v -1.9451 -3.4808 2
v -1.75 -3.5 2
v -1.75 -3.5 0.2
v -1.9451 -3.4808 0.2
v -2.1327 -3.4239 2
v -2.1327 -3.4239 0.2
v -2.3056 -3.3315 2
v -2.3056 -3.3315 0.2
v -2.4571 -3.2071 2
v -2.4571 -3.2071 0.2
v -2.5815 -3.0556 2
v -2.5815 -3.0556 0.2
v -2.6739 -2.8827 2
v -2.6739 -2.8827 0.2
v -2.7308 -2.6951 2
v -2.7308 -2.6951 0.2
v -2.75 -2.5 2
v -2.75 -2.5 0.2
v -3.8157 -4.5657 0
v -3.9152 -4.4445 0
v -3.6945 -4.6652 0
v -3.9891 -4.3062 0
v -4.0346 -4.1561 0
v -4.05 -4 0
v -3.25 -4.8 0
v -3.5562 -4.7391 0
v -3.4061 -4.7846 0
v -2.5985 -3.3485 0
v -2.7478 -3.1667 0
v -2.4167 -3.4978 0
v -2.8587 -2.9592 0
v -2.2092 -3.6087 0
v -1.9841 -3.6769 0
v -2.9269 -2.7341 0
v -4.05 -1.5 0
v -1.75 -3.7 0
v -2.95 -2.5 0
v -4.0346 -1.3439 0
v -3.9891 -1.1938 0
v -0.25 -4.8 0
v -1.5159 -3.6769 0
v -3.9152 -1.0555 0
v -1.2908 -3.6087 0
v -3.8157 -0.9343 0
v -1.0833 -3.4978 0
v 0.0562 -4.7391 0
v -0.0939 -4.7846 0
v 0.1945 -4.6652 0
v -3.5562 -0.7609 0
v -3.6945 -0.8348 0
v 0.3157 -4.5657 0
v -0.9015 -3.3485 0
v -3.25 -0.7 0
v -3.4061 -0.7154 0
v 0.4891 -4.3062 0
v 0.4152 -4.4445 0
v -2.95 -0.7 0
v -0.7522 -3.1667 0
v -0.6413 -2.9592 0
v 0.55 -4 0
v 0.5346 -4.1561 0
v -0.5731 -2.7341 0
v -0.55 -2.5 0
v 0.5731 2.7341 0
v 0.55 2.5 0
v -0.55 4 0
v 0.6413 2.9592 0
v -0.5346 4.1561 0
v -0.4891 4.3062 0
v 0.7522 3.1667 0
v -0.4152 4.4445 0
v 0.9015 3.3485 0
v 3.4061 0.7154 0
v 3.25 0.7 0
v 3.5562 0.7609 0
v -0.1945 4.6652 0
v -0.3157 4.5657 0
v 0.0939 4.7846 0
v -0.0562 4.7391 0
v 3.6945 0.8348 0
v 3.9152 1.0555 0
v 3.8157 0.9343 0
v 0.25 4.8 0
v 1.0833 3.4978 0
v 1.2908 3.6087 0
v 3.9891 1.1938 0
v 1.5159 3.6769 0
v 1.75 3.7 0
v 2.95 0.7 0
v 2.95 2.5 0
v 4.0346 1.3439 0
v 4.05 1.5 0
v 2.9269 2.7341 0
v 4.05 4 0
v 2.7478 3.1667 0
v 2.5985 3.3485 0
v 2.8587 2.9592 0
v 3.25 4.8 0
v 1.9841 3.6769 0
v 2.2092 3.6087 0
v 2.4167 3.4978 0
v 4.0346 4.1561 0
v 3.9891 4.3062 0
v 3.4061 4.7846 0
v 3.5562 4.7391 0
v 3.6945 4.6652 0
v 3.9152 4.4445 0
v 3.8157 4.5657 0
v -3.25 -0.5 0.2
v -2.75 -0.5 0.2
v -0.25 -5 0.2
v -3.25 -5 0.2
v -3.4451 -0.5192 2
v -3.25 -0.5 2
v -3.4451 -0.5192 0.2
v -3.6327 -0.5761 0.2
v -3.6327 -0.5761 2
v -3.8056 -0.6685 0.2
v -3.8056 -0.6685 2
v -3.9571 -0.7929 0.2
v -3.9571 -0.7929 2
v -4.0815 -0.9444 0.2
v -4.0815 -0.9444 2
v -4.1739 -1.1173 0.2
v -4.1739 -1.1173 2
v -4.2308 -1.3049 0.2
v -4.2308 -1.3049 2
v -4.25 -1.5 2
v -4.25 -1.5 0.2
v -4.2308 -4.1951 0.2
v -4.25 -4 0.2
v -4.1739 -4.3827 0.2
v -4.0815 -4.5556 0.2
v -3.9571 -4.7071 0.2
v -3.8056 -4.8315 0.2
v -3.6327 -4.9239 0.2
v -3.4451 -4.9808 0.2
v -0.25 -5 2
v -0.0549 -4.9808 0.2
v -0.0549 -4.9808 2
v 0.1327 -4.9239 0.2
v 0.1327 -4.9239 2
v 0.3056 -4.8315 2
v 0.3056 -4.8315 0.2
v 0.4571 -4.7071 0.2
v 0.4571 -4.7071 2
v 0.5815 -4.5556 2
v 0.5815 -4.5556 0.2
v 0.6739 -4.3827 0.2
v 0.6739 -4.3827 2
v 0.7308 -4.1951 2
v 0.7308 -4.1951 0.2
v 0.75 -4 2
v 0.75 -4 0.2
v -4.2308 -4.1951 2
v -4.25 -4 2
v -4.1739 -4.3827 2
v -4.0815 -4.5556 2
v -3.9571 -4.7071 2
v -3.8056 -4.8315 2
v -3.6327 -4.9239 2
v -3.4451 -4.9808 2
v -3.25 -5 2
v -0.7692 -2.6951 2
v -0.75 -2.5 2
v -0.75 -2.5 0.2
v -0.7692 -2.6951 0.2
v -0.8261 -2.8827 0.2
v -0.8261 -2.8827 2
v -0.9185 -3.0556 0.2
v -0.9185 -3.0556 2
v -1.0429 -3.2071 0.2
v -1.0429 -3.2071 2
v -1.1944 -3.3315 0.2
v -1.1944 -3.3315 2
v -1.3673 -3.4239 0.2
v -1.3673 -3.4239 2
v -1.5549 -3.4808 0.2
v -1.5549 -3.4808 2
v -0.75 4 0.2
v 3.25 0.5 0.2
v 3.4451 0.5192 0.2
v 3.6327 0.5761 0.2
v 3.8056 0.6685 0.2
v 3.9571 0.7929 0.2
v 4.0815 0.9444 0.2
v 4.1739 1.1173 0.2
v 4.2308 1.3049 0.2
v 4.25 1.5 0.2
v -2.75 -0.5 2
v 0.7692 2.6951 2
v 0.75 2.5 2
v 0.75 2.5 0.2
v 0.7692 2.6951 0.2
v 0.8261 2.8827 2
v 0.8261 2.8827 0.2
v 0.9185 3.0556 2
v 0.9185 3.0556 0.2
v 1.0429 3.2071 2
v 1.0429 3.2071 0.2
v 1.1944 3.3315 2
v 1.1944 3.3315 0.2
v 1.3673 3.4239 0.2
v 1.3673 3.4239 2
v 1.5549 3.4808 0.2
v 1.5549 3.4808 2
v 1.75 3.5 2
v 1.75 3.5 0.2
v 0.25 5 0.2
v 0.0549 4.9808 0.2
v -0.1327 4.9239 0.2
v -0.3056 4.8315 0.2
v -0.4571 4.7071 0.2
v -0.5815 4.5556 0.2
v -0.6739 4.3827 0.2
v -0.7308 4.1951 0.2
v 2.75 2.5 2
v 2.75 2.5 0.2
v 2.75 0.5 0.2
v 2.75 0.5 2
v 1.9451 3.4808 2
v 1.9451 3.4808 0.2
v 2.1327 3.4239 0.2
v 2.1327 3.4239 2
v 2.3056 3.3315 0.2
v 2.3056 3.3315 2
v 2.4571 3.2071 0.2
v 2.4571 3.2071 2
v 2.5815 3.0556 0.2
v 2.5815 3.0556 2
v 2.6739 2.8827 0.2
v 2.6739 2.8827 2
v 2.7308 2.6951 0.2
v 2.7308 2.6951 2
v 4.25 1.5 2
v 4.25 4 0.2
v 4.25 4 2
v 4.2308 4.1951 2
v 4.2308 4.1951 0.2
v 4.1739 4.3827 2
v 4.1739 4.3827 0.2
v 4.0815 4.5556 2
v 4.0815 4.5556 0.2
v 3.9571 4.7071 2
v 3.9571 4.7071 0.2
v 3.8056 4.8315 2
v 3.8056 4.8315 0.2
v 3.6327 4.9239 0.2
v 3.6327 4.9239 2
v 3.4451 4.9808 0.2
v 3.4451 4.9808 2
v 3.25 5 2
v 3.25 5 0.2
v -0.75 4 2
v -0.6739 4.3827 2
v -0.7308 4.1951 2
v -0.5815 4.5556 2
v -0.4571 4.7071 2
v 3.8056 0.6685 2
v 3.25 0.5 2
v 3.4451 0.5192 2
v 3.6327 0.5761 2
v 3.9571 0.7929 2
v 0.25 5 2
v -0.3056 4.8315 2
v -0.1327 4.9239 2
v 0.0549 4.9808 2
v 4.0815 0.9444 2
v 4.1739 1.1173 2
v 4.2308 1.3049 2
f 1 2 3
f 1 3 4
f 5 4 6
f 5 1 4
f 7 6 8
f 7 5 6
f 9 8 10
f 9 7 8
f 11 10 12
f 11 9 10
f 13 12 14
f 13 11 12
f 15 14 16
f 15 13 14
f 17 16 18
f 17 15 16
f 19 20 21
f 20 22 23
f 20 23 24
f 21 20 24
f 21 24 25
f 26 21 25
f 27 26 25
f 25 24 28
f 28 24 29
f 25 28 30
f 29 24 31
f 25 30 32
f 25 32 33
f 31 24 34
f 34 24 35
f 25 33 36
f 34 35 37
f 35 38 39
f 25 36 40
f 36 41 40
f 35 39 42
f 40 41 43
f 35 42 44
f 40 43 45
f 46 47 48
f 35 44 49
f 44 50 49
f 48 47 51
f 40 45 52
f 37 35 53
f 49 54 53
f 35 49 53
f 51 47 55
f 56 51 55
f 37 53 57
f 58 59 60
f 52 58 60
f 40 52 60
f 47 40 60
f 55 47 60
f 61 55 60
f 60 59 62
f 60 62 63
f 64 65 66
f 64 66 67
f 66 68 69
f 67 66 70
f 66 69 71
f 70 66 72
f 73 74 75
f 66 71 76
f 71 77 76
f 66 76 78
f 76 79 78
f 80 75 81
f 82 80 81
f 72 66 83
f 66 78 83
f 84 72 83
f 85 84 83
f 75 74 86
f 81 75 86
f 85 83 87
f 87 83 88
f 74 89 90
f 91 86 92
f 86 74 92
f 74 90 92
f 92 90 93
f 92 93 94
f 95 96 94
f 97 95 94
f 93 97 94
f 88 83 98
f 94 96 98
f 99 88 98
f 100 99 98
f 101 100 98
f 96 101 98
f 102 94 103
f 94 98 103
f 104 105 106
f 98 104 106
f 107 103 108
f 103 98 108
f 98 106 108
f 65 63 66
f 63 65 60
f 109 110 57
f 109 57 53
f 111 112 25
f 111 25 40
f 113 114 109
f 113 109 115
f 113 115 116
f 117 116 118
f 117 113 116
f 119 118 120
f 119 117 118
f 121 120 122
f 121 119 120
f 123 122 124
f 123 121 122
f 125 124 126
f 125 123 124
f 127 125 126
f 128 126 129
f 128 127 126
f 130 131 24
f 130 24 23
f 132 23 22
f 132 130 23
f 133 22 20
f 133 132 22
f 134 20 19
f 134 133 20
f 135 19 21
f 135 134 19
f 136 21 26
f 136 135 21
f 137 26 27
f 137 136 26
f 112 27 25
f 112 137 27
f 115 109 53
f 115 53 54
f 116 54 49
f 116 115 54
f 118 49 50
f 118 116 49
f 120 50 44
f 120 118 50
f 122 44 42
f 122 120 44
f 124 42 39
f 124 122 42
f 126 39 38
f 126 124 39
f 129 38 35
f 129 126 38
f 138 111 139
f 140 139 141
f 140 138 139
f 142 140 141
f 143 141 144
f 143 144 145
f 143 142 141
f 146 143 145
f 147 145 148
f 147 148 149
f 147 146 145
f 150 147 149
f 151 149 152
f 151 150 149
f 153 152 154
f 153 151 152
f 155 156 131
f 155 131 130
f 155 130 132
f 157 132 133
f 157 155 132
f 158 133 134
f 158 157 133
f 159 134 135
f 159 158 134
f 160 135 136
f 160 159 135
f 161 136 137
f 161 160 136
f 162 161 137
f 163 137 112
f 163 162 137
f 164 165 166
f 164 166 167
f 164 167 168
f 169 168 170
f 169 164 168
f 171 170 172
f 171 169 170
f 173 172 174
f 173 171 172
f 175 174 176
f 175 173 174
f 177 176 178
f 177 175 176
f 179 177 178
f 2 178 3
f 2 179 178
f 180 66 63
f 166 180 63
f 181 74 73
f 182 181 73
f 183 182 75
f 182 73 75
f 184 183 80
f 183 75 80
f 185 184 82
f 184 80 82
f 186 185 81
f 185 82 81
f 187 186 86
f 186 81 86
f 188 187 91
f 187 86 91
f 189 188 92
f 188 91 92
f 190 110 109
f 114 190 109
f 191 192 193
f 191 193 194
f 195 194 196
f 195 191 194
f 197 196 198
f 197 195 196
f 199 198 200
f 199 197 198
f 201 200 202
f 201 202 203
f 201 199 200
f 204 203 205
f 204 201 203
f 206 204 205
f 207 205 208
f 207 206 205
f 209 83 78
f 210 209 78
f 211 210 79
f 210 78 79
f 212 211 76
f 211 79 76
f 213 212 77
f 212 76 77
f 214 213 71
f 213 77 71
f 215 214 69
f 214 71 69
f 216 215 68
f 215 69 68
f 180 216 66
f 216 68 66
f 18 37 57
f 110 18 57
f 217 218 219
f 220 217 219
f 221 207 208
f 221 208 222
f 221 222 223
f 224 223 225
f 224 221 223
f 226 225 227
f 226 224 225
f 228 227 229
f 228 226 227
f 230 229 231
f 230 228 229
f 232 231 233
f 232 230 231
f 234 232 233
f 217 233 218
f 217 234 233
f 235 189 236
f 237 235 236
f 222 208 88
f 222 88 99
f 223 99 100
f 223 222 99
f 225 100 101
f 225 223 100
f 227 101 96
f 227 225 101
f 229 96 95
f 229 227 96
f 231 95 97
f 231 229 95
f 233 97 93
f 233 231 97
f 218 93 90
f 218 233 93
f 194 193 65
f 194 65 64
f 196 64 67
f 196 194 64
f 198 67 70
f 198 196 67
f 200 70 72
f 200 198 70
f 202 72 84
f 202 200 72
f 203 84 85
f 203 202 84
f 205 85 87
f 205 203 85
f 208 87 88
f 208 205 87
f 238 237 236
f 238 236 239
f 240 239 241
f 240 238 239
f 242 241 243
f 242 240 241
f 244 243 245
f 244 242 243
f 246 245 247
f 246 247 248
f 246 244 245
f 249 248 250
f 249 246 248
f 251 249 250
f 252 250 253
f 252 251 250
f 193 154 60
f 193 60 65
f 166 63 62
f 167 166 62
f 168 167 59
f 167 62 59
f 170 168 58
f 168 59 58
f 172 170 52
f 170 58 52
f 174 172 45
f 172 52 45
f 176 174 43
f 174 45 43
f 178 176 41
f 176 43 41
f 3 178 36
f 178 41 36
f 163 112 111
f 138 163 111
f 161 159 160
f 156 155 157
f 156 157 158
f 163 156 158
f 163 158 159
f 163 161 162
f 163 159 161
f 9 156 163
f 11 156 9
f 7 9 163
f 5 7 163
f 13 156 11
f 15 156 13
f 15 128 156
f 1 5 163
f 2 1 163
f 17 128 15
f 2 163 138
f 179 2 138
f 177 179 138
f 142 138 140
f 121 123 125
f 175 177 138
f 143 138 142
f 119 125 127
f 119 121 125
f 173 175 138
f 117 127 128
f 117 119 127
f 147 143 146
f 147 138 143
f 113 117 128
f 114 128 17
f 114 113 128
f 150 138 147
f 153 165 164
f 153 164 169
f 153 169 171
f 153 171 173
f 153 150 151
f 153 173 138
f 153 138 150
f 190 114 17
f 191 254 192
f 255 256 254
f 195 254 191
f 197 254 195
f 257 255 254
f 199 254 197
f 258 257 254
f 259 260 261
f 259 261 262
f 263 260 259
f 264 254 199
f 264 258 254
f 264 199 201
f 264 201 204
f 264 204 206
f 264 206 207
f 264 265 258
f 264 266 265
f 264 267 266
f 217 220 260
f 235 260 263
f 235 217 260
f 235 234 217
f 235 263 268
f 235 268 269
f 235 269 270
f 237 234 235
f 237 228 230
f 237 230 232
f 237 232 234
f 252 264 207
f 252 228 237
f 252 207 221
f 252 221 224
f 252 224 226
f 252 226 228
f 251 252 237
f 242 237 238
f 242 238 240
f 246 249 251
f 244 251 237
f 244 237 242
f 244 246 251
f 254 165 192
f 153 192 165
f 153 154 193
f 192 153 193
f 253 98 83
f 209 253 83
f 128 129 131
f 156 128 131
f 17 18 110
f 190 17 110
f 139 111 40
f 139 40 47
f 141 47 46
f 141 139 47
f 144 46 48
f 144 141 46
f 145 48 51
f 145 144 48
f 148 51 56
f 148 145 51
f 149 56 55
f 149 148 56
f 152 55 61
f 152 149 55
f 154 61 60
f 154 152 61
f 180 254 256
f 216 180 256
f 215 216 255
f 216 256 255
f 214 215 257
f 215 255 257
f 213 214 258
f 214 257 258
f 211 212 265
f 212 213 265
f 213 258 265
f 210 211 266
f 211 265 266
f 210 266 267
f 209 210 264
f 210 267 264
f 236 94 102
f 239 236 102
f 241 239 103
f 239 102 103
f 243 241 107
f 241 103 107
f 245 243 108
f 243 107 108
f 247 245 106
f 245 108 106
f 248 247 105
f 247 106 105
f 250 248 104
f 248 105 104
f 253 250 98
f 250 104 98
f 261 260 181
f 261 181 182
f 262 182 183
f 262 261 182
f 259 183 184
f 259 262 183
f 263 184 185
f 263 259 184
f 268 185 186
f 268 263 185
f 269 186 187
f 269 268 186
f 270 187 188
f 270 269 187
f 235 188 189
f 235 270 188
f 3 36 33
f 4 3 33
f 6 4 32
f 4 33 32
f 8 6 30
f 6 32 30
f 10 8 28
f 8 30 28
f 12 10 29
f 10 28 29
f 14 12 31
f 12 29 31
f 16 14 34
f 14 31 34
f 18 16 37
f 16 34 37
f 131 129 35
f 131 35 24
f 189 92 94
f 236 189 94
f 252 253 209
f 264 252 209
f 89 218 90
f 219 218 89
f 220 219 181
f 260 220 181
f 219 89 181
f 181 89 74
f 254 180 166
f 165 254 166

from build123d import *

# Parameters (mm, degrees)
F1_DEPTH = 2
F2_R     = 0.99999
F3_SIZE  = 0.2


# Not quite as in the source:
# - a fillet or chamfer is up to 0.001 mm smaller than in the source, because OpenCascade refuses the exact size


with BuildPart() as f1:
    # F0 (on Top) → F1 (new body)
    with BuildSketch(Plane.XY):
        Polygon((-0.75, 5), (-0.75, 0), (-0.75, -3.5), (-2.75, -3.5), (-2.75, -0.5), (-4.25, -0.5), (-4.25, -5), (0.75, -5), (0.75, 0), (0.75, 3.5), (2.75, 3.5), (2.75, 0.5), (4.25, 0.5), (4.25, 5), align=None)
    extrude(amount=F1_DEPTH)

    # F2 (radius 1 in the source; OpenCascade refuses exactly that, so slightly less here)
    f2_edges = [f1.edges().sort_by_distance(p)[0] for p in [
        (-0.75, 5, 1),
        (0.75, 3.5, 1),
        (2.75, 3.5, 1),
        (4.25, 5, 1),
        (4.25, 0.5, 1),
        (0.75, -5, 1),
        (-4.25, -5, 1),
        (-4.25, -0.5, 1),
        (-0.75, -3.5, 1),
        (-2.75, -3.5, 1),
    ]]
    fillet(f2_edges, radius=F2_R)

    # F3
    f3_edges = [f1.edges().sort_by_distance(p)[0] for p in [
        (-0.75, 0.75, 0),
        (-0.45711, 4.70711, 0),
        (-1.04289, -3.20711, 0),
        (1.75, 5, 0),
        (-1.75, -3.5, 0),
        (3.95711, 4.70711, 0),
        (-2.45711, -3.20711, 0),
        (4.25, 2.75, 0),
        (-2.75, -1.500005, 0),
        (3.95711, 0.79289, 0),
        (-3.000005, -0.5, 0),
        (3.000005, 0.5, 0),
        (-3.95711, -0.79289, 0),
        (2.75, 1.500005, 0),
        (-4.25, -2.75, 0),
        (2.45711, 3.20711, 0),
        (-3.95711, -4.70711, 0),
        (1.75, 3.5, 0),
        (-1.75, -5, 0),
        (1.04289, 3.20711, 0),
        (0.45711, -4.70711, 0),
        (0.75, -0.75, 0),
    ]]
    chamfer(f3_edges, length=F3_SIZE)


solid = f1.part
